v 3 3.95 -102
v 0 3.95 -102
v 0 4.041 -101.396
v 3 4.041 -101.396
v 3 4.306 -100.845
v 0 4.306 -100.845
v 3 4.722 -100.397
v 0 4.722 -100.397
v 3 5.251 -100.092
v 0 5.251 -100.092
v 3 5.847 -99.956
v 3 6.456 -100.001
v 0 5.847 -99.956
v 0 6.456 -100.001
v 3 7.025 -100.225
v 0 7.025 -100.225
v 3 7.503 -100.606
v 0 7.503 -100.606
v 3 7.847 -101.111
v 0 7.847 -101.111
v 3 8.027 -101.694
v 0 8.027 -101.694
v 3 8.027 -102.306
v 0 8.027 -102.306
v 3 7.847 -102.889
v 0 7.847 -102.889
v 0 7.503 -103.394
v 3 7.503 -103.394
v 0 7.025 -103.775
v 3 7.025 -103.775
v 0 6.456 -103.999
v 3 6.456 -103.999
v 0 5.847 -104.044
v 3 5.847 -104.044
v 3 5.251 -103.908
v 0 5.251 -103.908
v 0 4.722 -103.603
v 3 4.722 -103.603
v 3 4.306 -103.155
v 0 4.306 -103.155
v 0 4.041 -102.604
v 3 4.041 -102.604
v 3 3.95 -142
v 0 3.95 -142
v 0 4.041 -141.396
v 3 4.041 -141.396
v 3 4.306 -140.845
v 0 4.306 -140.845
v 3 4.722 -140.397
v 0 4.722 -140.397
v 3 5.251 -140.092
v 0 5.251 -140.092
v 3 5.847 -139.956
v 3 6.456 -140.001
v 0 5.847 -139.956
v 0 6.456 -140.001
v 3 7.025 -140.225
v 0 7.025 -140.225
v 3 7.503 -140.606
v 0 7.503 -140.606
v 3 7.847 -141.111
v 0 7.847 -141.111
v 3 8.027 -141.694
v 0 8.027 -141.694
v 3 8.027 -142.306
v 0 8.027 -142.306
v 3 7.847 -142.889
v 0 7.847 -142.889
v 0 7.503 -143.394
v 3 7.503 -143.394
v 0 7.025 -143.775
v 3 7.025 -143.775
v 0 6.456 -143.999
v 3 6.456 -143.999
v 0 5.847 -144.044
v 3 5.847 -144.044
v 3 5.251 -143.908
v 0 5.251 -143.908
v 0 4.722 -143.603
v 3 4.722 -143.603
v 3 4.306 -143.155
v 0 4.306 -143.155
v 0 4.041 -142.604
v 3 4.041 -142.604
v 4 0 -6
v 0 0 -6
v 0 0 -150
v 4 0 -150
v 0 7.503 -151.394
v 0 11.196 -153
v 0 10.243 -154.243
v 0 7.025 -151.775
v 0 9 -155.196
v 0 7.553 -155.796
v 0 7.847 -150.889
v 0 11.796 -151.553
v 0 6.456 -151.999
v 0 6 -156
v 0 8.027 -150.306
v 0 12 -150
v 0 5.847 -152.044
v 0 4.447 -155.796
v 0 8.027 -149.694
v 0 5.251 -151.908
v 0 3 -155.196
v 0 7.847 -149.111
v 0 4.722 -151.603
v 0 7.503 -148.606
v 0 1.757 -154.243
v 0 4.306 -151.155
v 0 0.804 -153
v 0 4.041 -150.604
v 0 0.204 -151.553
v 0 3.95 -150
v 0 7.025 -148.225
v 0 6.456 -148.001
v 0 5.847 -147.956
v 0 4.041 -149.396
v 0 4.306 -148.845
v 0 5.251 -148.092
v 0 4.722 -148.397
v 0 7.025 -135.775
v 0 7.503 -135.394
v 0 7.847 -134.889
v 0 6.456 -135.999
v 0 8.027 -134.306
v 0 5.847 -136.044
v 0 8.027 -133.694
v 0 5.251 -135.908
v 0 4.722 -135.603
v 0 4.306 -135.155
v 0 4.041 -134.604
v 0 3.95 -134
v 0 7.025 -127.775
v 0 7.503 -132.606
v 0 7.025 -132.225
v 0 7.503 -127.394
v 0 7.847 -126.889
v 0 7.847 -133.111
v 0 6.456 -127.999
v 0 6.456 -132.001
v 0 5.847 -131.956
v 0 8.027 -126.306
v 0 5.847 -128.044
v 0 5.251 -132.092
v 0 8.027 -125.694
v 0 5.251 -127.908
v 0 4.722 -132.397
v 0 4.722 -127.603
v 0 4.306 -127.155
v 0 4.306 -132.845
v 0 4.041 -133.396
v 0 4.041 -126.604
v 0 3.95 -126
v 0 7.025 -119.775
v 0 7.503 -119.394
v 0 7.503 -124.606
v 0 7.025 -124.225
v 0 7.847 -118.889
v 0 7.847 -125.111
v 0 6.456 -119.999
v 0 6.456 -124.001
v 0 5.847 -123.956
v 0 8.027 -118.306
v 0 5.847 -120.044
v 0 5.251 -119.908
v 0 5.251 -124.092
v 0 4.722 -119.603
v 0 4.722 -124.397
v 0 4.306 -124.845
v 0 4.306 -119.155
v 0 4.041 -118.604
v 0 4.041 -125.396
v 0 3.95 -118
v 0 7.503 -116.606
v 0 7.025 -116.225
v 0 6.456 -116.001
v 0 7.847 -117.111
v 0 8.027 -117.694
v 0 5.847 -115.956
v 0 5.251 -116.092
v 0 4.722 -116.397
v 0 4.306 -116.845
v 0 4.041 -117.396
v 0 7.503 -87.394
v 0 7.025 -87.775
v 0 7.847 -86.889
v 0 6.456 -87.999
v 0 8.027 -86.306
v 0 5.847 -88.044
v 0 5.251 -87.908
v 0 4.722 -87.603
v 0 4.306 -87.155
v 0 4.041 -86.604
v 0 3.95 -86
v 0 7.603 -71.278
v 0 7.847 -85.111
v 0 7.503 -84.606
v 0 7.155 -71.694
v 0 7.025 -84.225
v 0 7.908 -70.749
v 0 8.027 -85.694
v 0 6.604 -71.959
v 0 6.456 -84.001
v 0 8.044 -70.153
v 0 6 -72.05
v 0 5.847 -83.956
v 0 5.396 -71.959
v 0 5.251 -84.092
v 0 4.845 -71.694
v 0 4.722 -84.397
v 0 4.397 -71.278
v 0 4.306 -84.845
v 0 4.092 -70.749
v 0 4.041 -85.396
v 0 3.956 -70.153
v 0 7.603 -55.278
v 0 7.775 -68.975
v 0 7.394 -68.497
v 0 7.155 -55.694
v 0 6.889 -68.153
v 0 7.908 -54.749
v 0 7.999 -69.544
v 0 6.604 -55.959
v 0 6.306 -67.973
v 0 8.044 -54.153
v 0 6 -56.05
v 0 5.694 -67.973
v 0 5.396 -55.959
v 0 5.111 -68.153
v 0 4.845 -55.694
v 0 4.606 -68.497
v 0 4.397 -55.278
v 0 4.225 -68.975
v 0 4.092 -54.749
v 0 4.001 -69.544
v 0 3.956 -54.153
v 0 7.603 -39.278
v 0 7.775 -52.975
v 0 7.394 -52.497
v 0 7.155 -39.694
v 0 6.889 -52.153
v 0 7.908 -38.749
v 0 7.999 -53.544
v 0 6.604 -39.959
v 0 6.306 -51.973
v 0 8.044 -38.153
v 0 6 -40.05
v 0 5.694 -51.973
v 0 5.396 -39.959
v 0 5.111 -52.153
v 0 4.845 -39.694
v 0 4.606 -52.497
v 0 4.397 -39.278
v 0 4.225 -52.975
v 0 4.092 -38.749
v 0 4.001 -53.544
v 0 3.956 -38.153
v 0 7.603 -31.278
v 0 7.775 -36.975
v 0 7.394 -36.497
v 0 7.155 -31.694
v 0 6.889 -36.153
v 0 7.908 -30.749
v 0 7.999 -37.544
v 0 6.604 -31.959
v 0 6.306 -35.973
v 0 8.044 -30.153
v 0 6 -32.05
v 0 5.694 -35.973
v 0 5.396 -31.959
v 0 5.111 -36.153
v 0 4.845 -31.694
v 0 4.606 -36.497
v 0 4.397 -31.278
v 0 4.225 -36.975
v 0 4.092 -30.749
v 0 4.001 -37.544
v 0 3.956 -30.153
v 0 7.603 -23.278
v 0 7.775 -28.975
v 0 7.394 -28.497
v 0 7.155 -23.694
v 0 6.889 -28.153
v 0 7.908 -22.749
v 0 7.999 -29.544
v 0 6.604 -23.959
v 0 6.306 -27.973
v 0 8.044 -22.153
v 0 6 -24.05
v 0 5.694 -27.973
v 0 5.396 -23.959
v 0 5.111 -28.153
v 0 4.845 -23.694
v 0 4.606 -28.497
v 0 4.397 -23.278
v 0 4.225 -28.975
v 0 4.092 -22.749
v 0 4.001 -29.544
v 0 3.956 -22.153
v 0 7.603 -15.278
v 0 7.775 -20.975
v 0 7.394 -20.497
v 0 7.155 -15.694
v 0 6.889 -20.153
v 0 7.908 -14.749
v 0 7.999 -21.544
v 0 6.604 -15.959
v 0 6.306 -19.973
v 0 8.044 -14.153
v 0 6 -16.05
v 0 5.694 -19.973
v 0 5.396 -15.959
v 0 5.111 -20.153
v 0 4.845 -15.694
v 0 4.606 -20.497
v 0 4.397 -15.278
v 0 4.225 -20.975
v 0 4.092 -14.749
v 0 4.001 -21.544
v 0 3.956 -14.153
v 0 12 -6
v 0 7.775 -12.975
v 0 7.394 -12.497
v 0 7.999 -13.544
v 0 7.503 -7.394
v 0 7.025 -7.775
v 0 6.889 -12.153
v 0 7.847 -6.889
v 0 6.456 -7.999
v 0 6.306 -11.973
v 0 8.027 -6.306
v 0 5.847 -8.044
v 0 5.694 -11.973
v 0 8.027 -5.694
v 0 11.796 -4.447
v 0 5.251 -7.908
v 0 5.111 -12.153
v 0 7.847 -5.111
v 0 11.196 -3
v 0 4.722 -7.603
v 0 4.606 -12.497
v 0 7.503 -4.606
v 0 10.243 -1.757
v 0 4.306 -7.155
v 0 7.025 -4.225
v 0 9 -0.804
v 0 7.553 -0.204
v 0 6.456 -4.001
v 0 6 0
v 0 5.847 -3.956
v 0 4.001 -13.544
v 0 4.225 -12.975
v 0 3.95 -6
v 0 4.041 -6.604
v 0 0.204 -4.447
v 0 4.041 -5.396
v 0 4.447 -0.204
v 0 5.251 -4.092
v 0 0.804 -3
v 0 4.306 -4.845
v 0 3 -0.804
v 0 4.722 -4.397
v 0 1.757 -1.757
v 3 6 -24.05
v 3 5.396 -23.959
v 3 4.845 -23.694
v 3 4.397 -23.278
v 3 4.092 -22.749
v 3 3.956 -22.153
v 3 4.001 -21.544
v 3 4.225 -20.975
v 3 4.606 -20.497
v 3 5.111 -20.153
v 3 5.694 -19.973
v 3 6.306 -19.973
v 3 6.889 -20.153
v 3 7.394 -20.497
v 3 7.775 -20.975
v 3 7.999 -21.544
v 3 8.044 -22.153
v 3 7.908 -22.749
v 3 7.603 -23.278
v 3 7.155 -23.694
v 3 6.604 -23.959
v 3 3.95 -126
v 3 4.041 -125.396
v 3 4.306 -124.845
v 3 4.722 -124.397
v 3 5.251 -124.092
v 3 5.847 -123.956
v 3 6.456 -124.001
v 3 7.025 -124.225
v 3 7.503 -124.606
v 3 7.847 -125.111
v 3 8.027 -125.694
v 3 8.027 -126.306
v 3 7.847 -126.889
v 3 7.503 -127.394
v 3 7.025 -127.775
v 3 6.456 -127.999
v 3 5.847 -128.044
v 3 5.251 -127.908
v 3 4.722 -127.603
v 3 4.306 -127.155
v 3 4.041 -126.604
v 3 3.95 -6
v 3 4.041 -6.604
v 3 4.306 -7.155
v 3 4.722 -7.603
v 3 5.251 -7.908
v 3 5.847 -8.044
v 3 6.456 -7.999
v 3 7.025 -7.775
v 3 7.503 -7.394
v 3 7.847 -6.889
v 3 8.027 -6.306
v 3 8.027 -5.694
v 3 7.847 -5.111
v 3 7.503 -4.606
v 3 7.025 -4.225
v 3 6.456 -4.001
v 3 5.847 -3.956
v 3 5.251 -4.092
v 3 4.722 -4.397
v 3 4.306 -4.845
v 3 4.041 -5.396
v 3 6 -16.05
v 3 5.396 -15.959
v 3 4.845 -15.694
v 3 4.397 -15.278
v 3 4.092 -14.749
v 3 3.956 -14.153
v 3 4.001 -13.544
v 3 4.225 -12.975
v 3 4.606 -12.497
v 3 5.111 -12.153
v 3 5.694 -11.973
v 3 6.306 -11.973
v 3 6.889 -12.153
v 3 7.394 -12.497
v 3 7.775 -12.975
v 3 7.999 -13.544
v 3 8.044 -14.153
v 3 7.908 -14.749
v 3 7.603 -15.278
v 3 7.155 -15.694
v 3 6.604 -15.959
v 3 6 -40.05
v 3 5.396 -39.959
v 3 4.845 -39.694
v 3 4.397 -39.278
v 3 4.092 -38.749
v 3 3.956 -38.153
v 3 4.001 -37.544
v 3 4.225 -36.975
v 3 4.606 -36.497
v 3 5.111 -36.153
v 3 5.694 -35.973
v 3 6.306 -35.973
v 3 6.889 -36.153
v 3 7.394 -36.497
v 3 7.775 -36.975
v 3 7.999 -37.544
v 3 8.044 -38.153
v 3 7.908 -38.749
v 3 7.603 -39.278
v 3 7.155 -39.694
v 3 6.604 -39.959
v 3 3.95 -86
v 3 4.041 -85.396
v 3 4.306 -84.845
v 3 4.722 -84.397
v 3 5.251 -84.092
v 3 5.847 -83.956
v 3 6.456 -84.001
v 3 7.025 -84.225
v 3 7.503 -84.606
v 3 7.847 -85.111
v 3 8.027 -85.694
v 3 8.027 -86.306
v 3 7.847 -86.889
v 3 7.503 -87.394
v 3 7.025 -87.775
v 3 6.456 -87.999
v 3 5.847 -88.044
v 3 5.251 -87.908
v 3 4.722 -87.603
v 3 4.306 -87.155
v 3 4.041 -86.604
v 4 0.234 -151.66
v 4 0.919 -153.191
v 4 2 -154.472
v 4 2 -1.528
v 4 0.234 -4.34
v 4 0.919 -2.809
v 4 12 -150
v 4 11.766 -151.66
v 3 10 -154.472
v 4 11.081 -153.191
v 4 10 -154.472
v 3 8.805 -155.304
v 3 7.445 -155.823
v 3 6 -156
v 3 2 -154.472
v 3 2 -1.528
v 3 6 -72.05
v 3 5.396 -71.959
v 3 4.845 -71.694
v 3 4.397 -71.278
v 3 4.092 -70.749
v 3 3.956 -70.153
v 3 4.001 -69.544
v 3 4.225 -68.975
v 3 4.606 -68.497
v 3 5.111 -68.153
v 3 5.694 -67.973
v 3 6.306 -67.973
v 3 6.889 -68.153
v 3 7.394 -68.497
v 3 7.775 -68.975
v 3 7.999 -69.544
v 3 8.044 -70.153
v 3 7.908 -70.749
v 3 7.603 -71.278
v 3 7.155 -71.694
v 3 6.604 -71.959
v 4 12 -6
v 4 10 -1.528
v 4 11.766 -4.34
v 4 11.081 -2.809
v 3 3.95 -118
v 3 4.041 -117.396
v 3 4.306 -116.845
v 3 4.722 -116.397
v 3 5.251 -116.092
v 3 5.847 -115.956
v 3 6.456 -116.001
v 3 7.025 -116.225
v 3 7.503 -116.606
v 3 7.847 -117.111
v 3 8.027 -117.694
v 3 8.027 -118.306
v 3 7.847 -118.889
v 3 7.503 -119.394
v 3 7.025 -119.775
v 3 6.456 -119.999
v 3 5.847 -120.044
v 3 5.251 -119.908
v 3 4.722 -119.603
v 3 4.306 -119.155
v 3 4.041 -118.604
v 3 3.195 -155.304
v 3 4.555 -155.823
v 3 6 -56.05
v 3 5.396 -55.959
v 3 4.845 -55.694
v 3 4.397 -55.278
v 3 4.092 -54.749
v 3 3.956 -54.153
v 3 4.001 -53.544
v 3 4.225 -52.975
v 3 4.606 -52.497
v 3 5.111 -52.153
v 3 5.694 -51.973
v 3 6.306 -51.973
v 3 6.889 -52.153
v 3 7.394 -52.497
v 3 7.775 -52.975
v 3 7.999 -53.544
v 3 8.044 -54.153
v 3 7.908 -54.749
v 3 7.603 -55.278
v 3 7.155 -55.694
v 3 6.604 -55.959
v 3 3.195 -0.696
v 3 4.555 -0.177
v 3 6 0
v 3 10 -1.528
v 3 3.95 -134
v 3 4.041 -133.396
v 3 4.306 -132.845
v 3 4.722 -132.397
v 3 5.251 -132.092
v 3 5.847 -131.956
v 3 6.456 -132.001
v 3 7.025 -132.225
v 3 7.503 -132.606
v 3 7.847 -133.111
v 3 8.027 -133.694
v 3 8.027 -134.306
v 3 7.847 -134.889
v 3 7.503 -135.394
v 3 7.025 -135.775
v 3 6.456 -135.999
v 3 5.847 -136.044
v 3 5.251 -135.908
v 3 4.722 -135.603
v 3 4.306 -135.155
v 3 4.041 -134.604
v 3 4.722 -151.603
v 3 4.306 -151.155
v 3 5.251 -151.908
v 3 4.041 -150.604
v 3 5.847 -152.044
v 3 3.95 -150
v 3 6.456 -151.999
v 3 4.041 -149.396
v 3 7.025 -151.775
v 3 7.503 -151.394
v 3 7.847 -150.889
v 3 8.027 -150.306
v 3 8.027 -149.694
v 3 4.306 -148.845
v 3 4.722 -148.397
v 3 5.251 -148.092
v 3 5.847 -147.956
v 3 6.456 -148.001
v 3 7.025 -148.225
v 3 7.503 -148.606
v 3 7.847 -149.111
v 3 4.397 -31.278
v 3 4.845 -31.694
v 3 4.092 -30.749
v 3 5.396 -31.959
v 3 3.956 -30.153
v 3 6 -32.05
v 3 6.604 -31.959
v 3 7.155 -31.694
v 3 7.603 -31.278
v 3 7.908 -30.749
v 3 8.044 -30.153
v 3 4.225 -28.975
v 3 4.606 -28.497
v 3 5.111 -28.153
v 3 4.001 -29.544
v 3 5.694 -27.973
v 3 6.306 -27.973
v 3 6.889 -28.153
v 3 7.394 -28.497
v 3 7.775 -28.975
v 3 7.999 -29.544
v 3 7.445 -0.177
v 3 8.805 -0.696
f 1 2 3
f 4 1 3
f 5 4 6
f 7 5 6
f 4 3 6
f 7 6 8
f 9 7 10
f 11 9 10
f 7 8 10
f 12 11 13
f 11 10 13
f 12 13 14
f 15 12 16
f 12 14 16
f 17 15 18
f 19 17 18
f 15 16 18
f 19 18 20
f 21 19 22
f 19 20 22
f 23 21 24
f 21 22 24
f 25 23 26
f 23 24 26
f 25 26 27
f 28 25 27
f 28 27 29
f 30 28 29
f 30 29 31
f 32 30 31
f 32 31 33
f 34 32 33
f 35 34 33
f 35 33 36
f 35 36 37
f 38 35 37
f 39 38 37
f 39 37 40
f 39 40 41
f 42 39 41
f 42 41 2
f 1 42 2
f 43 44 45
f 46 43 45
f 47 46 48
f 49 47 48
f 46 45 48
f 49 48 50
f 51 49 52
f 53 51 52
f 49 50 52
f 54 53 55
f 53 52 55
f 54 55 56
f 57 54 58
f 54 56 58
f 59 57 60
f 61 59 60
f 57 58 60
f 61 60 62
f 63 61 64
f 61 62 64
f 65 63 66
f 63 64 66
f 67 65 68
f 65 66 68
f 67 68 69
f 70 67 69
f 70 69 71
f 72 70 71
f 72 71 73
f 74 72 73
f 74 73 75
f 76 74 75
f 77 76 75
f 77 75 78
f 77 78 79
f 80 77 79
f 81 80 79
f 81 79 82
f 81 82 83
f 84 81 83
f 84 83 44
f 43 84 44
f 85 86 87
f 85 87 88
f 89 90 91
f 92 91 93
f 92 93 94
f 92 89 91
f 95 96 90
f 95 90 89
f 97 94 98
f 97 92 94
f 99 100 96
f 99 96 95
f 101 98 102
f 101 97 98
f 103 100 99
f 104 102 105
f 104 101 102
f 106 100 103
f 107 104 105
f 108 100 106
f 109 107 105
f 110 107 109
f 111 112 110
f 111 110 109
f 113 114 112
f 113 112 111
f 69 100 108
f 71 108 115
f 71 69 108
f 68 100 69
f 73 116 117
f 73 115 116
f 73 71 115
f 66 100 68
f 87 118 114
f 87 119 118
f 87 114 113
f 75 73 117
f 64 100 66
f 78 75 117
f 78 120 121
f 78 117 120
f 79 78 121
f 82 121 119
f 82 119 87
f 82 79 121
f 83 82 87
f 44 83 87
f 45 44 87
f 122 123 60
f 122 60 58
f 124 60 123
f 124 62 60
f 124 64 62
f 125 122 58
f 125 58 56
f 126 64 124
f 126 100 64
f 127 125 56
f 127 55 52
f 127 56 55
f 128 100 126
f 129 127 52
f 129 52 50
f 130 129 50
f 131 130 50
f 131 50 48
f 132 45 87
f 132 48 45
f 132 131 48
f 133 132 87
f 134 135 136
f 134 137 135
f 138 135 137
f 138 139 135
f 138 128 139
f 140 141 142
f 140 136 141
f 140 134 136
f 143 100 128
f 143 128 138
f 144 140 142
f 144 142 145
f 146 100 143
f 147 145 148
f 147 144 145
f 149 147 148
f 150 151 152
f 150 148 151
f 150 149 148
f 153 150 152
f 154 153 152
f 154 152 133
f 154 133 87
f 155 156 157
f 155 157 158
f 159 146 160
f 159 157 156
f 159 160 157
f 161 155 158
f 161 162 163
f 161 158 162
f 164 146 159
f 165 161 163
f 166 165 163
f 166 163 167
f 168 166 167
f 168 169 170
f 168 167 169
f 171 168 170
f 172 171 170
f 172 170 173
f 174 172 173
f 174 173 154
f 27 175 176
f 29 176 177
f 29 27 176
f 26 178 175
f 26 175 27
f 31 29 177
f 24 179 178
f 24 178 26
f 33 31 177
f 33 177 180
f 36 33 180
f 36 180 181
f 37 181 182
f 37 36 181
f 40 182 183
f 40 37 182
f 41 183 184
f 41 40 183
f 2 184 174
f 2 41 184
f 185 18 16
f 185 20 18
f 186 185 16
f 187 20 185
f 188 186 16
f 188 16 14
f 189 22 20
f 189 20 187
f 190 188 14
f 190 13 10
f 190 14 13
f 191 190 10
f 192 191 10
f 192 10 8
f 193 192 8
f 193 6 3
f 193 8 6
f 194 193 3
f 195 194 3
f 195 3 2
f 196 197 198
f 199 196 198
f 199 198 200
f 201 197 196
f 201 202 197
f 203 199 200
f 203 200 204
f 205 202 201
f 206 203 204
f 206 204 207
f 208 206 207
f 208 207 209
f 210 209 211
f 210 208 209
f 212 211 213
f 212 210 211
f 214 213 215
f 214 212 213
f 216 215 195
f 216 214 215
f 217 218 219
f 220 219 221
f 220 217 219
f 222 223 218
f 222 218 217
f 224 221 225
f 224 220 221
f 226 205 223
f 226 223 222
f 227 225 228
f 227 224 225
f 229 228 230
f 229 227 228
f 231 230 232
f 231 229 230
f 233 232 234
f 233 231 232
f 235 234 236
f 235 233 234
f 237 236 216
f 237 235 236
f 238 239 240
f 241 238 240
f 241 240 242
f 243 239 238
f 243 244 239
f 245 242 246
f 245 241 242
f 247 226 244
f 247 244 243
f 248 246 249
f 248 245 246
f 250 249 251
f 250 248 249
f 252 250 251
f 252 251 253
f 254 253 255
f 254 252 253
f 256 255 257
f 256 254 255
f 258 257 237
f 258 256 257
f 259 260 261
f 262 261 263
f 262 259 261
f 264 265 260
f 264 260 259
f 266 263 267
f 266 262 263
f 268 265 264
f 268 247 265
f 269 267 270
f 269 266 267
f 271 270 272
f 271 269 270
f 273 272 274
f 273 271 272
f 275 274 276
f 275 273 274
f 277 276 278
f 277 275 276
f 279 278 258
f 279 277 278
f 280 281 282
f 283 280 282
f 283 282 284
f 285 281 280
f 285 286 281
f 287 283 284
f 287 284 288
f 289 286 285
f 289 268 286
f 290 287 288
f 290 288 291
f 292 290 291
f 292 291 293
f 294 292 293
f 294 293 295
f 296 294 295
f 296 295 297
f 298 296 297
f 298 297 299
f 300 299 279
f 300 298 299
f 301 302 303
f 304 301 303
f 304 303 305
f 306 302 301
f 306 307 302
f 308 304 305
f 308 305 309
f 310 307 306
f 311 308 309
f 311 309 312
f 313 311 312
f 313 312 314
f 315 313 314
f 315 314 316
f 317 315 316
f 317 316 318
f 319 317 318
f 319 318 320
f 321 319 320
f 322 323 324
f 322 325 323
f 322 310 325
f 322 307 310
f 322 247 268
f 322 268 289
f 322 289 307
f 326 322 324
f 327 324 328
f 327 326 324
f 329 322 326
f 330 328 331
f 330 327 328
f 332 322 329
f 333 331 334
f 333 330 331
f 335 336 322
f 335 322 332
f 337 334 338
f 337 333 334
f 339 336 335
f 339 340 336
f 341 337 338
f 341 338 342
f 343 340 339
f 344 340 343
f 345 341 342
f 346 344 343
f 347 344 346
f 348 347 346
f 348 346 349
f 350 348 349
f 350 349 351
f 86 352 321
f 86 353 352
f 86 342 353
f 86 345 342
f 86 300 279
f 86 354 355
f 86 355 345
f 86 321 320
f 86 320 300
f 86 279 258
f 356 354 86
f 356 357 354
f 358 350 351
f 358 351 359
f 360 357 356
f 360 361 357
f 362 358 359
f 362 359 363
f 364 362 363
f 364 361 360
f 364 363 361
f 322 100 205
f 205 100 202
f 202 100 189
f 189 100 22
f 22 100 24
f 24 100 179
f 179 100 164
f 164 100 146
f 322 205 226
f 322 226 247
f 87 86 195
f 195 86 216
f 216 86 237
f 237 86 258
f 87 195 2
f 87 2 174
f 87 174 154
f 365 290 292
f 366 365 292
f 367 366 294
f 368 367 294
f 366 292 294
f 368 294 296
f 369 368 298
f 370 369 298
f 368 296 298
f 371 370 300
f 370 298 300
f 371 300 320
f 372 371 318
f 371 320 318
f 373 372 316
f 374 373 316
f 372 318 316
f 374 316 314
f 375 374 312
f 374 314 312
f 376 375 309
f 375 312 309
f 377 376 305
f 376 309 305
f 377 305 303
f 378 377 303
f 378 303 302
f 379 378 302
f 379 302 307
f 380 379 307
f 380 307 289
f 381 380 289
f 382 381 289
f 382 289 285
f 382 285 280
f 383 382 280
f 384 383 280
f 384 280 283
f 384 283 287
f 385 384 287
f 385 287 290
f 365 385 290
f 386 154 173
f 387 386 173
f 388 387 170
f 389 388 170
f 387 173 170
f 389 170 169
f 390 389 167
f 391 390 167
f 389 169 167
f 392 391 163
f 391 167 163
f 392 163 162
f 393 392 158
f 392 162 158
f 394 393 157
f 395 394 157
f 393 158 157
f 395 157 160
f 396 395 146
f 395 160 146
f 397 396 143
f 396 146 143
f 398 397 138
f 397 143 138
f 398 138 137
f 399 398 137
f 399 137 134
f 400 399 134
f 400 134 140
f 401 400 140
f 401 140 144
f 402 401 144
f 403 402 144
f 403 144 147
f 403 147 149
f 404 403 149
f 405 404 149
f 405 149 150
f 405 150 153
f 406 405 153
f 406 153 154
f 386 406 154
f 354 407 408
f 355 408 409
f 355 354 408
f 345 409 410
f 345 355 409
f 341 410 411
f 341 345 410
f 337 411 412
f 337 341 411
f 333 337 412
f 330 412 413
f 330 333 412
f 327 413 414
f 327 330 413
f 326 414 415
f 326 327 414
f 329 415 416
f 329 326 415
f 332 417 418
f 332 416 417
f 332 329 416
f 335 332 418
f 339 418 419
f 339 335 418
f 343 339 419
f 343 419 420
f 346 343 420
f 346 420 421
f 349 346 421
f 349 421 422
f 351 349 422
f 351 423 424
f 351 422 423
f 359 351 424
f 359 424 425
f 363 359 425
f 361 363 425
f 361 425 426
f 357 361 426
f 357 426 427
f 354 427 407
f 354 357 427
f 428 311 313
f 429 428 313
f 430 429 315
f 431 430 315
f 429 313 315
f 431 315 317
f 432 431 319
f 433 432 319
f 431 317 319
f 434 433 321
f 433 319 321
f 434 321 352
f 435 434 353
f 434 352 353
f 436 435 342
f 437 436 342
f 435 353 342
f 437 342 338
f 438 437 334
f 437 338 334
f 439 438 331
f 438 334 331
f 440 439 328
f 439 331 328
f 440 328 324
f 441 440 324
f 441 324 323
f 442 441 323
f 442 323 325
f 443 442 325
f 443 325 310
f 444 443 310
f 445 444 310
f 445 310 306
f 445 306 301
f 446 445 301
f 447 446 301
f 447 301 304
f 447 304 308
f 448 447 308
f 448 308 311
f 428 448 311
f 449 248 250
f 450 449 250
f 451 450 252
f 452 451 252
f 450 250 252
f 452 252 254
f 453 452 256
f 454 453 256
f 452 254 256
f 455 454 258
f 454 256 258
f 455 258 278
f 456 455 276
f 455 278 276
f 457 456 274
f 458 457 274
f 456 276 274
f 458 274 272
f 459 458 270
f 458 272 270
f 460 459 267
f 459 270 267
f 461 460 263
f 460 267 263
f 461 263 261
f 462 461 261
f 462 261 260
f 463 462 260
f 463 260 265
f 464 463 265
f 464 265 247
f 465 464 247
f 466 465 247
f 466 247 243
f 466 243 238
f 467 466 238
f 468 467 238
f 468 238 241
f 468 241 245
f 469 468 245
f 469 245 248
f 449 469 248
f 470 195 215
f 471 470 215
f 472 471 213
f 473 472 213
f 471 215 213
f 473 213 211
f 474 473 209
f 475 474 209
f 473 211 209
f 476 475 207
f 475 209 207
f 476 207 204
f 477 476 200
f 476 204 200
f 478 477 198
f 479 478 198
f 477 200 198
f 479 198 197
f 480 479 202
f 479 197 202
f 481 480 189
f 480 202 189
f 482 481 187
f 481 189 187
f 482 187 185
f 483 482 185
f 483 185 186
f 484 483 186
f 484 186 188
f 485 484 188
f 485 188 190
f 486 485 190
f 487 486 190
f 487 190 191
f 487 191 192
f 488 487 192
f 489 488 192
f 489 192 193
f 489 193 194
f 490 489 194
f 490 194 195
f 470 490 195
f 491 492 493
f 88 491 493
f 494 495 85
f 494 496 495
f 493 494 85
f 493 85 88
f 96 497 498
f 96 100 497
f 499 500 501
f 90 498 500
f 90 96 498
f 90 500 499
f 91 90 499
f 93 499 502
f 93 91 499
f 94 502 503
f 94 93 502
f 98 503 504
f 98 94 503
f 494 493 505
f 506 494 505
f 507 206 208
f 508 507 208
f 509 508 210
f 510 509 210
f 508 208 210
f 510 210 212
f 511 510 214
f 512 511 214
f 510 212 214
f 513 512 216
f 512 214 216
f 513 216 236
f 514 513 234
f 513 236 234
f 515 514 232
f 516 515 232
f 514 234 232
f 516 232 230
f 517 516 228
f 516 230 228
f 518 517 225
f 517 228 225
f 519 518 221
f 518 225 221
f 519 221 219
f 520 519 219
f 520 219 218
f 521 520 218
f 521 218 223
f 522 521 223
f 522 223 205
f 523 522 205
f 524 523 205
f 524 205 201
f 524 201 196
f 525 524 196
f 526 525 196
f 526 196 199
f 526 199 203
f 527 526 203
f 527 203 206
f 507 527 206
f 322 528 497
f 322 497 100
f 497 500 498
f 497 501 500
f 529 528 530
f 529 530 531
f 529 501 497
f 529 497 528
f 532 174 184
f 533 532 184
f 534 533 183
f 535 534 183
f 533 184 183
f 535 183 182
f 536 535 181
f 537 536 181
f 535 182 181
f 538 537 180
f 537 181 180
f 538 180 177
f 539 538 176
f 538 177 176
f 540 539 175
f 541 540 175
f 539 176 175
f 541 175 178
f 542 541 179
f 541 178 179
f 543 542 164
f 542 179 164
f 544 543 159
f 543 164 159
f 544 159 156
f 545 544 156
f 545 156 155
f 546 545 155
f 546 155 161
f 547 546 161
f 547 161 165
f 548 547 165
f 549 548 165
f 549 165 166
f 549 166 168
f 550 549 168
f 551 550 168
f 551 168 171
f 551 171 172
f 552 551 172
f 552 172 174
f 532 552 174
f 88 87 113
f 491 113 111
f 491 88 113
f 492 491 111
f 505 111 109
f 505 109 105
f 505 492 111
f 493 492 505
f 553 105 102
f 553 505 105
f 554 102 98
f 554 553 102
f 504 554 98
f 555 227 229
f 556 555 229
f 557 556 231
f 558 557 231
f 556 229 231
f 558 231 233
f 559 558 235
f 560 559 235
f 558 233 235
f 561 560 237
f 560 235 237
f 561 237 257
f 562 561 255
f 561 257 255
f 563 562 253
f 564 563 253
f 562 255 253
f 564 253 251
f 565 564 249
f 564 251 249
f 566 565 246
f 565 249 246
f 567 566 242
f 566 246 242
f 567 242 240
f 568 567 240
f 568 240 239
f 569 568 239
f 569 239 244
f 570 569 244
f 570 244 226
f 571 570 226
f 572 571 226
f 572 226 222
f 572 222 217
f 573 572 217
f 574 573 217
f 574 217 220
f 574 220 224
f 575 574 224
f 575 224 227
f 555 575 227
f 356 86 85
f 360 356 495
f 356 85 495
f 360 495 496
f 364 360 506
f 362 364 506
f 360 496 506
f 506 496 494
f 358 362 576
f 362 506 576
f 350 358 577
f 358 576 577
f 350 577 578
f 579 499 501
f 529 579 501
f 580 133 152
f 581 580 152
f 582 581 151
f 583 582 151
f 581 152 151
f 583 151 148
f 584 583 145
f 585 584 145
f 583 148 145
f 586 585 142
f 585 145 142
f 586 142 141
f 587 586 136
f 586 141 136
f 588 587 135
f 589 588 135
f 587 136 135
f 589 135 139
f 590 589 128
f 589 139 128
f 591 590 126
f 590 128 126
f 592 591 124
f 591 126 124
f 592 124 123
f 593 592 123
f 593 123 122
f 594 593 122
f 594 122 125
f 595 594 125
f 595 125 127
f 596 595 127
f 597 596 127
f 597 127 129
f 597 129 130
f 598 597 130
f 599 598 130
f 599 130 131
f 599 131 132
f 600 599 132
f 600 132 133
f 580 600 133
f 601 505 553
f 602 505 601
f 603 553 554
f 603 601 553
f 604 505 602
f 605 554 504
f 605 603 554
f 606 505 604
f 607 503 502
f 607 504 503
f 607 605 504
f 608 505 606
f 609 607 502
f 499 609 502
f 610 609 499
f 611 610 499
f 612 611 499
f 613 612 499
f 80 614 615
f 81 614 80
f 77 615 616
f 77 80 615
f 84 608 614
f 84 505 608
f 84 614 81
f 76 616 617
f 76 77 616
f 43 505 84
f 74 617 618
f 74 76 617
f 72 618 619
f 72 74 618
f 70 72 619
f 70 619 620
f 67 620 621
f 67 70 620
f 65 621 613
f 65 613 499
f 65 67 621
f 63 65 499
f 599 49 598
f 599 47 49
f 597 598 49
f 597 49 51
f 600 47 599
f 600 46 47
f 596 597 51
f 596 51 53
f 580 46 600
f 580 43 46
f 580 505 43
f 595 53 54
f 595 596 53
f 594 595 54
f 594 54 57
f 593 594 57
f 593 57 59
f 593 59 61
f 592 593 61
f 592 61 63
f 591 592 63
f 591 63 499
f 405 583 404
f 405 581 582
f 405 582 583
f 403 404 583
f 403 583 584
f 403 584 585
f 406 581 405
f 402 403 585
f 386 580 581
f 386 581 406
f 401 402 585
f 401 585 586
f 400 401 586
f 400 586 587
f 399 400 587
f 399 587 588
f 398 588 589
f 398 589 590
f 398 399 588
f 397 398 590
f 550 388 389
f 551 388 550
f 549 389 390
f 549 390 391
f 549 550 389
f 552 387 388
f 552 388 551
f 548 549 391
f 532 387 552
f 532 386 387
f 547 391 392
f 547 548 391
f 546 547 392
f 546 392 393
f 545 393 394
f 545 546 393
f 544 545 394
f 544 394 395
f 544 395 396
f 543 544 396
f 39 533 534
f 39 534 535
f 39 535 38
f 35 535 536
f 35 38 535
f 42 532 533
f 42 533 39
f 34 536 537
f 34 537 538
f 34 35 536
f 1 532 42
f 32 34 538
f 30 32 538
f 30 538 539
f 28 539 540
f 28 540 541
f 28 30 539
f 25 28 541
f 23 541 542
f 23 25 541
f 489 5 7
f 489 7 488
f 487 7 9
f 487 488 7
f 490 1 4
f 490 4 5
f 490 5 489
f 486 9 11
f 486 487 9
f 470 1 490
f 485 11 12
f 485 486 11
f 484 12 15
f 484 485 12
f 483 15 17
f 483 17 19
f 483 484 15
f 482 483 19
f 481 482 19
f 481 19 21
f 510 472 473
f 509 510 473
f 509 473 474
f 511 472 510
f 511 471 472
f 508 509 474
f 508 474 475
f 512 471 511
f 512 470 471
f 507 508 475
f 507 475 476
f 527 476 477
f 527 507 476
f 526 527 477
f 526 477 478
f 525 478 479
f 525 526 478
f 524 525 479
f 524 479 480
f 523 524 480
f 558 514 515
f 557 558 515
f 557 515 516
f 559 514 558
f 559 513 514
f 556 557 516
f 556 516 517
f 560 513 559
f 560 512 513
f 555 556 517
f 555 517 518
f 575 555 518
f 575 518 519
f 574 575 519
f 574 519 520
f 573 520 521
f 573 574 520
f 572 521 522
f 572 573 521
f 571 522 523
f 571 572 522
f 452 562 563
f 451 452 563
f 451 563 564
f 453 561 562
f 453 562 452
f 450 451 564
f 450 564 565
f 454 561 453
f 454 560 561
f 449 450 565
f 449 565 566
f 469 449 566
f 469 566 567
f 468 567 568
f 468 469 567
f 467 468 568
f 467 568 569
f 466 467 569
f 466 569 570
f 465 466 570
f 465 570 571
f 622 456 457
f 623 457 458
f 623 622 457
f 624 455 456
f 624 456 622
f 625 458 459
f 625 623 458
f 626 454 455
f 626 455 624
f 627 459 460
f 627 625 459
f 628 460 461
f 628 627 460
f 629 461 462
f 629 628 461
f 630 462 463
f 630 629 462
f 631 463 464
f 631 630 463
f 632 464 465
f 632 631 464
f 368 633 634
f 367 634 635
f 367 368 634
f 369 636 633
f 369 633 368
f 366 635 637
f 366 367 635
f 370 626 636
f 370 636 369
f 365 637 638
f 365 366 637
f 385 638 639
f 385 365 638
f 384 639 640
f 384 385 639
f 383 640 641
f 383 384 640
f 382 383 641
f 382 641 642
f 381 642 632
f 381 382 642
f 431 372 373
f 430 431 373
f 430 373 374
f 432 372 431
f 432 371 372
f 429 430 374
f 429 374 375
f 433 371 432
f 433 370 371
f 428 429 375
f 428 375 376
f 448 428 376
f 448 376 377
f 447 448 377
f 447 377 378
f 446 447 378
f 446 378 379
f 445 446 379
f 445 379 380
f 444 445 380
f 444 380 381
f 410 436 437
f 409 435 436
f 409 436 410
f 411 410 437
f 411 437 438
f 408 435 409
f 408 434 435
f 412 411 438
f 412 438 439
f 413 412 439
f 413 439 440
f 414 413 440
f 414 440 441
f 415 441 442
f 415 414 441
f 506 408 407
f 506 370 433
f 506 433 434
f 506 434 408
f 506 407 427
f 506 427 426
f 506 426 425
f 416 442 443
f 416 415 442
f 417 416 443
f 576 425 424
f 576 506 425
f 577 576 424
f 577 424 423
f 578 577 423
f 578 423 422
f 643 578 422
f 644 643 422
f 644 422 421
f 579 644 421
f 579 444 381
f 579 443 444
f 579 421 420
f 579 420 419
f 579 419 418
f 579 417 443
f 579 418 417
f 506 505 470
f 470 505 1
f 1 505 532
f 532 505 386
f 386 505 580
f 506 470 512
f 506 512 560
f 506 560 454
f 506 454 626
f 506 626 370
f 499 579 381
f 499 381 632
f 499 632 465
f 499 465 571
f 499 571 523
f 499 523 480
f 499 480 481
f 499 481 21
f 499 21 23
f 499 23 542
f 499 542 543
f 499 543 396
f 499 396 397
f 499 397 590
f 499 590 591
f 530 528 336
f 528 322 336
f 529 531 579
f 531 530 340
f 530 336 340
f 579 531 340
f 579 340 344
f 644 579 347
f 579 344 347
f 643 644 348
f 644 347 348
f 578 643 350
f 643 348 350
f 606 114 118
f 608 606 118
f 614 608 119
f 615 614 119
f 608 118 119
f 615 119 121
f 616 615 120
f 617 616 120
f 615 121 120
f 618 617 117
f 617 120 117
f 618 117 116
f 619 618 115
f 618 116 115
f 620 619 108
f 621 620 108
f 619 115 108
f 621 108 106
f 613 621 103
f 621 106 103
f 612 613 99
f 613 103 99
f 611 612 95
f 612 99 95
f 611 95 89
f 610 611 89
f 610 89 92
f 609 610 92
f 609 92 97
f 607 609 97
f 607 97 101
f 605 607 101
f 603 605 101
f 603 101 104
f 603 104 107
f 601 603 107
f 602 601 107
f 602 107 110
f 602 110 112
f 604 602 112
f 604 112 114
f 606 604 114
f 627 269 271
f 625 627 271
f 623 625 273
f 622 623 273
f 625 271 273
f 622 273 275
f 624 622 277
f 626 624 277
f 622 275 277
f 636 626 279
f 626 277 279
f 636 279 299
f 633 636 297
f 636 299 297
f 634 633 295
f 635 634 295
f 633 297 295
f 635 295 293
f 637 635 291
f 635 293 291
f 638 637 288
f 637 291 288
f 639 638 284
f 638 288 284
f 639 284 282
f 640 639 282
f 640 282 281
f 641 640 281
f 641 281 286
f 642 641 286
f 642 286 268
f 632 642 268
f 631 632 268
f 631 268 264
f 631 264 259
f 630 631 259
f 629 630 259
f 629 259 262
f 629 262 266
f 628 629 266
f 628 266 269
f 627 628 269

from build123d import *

# Parameters (mm, degrees)
BOSS_EXTRUDE1_DEPTH     = 156
FILLET1_R               = 6
SKETCH2_R               = 2.05
CUT_EXTRUDE1_DEPTH      = 157.511980372
LPATTERN1_COUNT         = 9
LPATTERN1_PITCH         = 8
MIRROR1_COPY_1_SKETCH_R = 2.05
MIRROR1_COPY_1_DEPTH    = 157.511980372
MIRROR1_COPY_2_SKETCH_R = 2.05
MIRROR1_COPY_2_DEPTH    = 157.511980372
MIRROR1_COPY_3_SKETCH_R = 2.05
MIRROR1_COPY_3_DEPTH    = 157.511980372
MIRROR1_COPY_4_SKETCH_R = 2.05
MIRROR1_COPY_4_DEPTH    = 157.511980372
MIRROR1_COPY_5_SKETCH_R = 2.05
MIRROR1_COPY_5_DEPTH    = 157.511980372
MIRROR1_COPY_6_SKETCH_R = 2.05
MIRROR1_COPY_6_DEPTH    = 157.511980372


with BuildPart() as part:
    # Sketch1 → Boss-Extrude1 (new body)
    with BuildSketch(Plane.XY):
        Polygon((0, 0), (4, 0), (4, 2), (3, 2), (3, 10), (4, 10), (4, 12), (0, 12), align=None)
    extrude(amount=-BOSS_EXTRUDE1_DEPTH)

    # Fillet1
    fillet1_edges = [part.edges().sort_by_distance(p)[0] for p in [
        (2, 12, 0),
        (2, 0, 0),
        (2, 0, -156),
        (2, 12, -156),
    ]]
    fillet(fillet1_edges, radius=FILLET1_R - 0.0001)  # a hair under: the kernel refuses the full size

    # Sketch2 → Cut-Extrude1 (cut, through all)
    with BuildSketch(Plane.ZY):
        with Locations(Location((-150, 6, 0), (0, 0, 270))):
            Circle(SKETCH2_R)
    cut_extrude1 = extrude(amount=-CUT_EXTRUDE1_DEPTH, mode=Mode.SUBTRACT)

    # LPattern1: Cut-Extrude1 ×9, 2 skipped
    with Locations(*[(0, 0, i * LPATTERN1_PITCH) for i in range(1, LPATTERN1_COUNT) if i not in (5, 7)]):
        add(cut_extrude1, mode=Mode.SUBTRACT)

    # Mirror1: Cut-Extrude1 across plane
    add(cut_extrude1.mirror(Plane.XY.offset(-78)), mode=Mode.SUBTRACT)

    # Mirror1 copy 1 sketch → Mirror1 copy 1 (cut, through all)
    with BuildSketch(Plane(origin=(0, 0, -164), x_dir=(0, 0, -1), z_dir=(-1, 0, 0))):
        with Locations((-150, -6)):
            Circle(MIRROR1_COPY_1_SKETCH_R)
    extrude(amount=-MIRROR1_COPY_1_DEPTH, mode=Mode.SUBTRACT)

    # Mirror1 copy 2 sketch → Mirror1 copy 2 (cut, through all)
    with BuildSketch(Plane(origin=(0, 0, -172), x_dir=(0, 0, -1), z_dir=(-1, 0, 0))):
        with Locations((-150, -6)):
            Circle(MIRROR1_COPY_2_SKETCH_R)
    extrude(amount=-MIRROR1_COPY_2_DEPTH, mode=Mode.SUBTRACT)

    # Mirror1 copy 3 sketch → Mirror1 copy 3 (cut, through all)
    with BuildSketch(Plane(origin=(0, 0, -180), x_dir=(0, 0, -1), z_dir=(-1, 0, 0))):
        with Locations((-150, -6)):
            Circle(MIRROR1_COPY_3_SKETCH_R)
    extrude(amount=-MIRROR1_COPY_3_DEPTH, mode=Mode.SUBTRACT)

    # Mirror1 copy 4 sketch → Mirror1 copy 4 (cut, through all)
    with BuildSketch(Plane(origin=(0, 0, -188), x_dir=(0, 0, -1), z_dir=(-1, 0, 0))):
        with Locations((-150, -6)):
            Circle(MIRROR1_COPY_4_SKETCH_R)
    extrude(amount=-MIRROR1_COPY_4_DEPTH, mode=Mode.SUBTRACT)

    # Mirror1 copy 5 sketch → Mirror1 copy 5 (cut, through all)
    with BuildSketch(Plane(origin=(0, 0, -204), x_dir=(0, 0, -1), z_dir=(-1, 0, 0))):
        with Locations((-150, -6)):
            Circle(MIRROR1_COPY_5_SKETCH_R)
    extrude(amount=-MIRROR1_COPY_5_DEPTH, mode=Mode.SUBTRACT)

    # Mirror1 copy 6 sketch → Mirror1 copy 6 (cut, through all)
    with BuildSketch(Plane(origin=(0, 0, -220), x_dir=(0, 0, -1), z_dir=(-1, 0, 0))):
        with Locations((-150, -6)):
            Circle(MIRROR1_COPY_6_SKETCH_R)
    extrude(amount=-MIRROR1_COPY_6_DEPTH, mode=Mode.SUBTRACT)


solid = part.part
